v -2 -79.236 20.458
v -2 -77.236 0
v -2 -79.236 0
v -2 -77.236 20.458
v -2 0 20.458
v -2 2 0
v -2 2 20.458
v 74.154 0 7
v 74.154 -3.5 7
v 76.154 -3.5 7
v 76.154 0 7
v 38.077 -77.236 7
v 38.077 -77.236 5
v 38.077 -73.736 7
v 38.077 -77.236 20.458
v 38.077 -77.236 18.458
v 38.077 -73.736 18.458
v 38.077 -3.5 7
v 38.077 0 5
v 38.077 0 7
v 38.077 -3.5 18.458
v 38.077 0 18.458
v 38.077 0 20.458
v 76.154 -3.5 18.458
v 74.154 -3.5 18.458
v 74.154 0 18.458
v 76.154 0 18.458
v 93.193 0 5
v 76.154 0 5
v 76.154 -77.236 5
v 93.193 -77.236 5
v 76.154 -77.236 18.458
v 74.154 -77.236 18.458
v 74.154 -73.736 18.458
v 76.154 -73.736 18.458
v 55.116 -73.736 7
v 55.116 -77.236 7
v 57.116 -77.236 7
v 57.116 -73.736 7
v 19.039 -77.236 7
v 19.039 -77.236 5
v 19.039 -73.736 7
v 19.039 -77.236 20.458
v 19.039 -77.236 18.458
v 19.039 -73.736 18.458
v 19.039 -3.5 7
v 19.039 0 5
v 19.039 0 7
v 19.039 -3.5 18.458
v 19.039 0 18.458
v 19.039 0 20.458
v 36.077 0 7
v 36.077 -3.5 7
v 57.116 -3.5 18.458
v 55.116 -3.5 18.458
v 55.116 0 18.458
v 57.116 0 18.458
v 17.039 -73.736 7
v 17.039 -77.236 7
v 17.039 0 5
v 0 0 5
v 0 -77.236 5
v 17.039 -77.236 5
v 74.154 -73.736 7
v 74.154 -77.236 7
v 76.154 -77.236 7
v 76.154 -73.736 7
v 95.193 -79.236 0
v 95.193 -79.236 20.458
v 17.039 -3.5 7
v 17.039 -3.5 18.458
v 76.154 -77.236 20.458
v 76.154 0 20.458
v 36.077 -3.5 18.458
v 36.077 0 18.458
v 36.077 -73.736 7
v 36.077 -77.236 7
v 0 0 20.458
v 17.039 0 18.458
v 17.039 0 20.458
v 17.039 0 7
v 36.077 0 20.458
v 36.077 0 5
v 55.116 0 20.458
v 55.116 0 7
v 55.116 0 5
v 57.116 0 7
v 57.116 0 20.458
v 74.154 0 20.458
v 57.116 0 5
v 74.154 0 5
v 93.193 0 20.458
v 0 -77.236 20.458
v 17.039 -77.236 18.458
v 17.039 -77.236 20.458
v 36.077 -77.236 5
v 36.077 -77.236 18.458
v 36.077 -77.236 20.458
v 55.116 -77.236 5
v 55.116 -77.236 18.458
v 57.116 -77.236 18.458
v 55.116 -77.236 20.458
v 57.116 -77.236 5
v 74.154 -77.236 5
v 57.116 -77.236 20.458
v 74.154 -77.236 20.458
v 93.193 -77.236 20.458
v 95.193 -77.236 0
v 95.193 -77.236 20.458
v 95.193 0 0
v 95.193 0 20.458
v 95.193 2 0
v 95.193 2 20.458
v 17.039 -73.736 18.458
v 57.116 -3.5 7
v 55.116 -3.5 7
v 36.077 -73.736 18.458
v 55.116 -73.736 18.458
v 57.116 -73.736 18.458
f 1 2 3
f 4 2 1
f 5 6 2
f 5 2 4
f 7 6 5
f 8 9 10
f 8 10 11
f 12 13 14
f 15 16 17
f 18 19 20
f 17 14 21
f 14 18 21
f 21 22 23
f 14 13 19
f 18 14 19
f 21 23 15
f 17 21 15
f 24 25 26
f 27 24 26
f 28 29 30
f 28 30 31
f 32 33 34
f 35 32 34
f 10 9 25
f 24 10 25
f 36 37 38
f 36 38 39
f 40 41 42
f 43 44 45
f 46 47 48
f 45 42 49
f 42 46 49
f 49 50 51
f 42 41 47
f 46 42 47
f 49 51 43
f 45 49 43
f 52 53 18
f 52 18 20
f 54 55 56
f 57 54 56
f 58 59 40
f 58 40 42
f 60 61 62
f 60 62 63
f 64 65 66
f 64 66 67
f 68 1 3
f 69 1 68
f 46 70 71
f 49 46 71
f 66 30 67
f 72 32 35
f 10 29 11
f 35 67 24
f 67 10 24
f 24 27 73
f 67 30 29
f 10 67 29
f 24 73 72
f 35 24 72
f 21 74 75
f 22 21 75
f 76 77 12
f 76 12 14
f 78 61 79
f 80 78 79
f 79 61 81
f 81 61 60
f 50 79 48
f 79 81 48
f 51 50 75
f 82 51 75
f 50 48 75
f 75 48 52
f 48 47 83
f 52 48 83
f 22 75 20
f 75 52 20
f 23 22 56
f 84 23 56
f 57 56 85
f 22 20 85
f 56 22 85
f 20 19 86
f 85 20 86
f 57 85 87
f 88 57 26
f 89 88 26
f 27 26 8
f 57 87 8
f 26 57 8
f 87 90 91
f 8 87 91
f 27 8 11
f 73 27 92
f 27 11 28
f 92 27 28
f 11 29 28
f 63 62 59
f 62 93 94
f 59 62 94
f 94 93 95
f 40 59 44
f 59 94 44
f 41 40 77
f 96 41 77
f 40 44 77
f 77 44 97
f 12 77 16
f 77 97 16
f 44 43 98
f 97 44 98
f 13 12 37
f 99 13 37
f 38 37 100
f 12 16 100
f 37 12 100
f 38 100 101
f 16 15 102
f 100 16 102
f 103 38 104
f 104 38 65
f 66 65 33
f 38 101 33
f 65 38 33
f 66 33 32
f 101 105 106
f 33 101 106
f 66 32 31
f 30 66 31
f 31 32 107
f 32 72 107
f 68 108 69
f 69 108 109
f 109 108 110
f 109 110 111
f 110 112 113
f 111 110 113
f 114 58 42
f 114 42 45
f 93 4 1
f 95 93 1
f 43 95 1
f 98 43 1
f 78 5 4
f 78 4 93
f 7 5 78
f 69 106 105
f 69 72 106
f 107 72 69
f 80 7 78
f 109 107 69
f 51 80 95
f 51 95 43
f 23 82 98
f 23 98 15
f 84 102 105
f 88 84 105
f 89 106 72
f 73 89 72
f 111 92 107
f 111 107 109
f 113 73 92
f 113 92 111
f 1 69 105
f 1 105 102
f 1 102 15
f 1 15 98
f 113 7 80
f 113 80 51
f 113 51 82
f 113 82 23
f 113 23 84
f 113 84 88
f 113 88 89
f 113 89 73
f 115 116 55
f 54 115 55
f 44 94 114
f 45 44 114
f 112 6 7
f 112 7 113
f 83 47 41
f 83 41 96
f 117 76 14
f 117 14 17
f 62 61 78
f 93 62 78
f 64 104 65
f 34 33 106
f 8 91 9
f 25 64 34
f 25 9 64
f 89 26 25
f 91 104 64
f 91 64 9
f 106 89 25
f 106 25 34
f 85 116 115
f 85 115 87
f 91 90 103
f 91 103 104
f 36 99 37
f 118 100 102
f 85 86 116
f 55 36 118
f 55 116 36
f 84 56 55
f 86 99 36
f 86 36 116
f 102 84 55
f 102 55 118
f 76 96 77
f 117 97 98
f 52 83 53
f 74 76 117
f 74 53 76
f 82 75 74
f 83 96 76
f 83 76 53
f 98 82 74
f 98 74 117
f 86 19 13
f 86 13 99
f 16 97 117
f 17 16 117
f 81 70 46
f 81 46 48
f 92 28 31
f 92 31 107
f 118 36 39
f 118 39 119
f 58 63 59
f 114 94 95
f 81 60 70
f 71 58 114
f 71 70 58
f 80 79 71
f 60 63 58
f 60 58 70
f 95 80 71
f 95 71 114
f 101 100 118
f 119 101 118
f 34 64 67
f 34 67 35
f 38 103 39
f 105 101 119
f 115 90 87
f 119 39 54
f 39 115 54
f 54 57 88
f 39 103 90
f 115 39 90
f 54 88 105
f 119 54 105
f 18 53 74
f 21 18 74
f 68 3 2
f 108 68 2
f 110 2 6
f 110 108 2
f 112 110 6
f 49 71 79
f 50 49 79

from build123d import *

# Parameters (mm, degrees)
SKETCH1_W           = 95.192719723
SKETCH1_H           = 77.236030742
BOSS_EXTRUDE1_DEPTH = 5
SKETCH2_W           = 20.458340989
SKETCH2_H           = 77.236030742
BOSS_EXTRUDE2_DEPTH = 2
SKETCH3_W           = 97.192719723
SKETCH3_H           = 20.458340989
BOSS_EXTRUDE3_DEPTH = 2
SKETCH4_W           = 97.192719723
SKETCH4_H           = 20.458340989
BOSS_EXTRUDE4_DEPTH = 2
LPATTERN1_COUNT     = 6
LPATTERN1_PITCH     = 19.038543945
CUT_EXTRUDE1_REACH  = 115.159
SKETCH7_W           = 11.458340989
SKETCH7_H           = 3.5


with BuildPart() as part:
    # Sketch1 → Boss-Extrude1 (new body)
    with BuildSketch(Plane.XY):
        with Locations((47.596359862, -38.618015371)):
            Rectangle(SKETCH1_W, SKETCH1_H)
    extrude(amount=BOSS_EXTRUDE1_DEPTH)

    # Sketch2 → Boss-Extrude2 (add)
    with BuildSketch(Plane.ZY):
        with Locations((10.229170494, -38.618015371)):
            Rectangle(SKETCH2_W, SKETCH2_H)
    boss_extrude2 = extrude(amount=BOSS_EXTRUDE2_DEPTH)

    # Sketch3 → Boss-Extrude3 (add)
    with BuildSketch(Plane(origin=(0, 0, 0), x_dir=(1, 0, 0), z_dir=(0, 1, 0))):
        with Locations((46.596359862, -10.229170494)):
            Rectangle(SKETCH3_W, SKETCH3_H)
    extrude(amount=BOSS_EXTRUDE3_DEPTH)

    # Sketch4 → Boss-Extrude4 (add)
    with BuildSketch(Plane.XZ.offset(77.236030742)):
        with Locations((46.596359862, 10.229170494)):
            Rectangle(SKETCH4_W, SKETCH4_H)
    extrude(amount=BOSS_EXTRUDE4_DEPTH)

    # LPattern1: Boss-Extrude2 ×6
    with Locations(*[(i * LPATTERN1_PITCH, 0, 0) for i in range(1, LPATTERN1_COUNT)]):
        add(boss_extrude2)

    # Cut-Extrude1: up to this face of the body (flat: up to its plane)
    cut_extrude1_end = Plane(part.part.faces().sort_by_distance((76.154175778, -38.618015371, 12.729170494))[0])
    # Sketch7 → Cut-Extrude1 (cut, up to the picked face)
    with BuildSketch(Plane.ZY.offset(-17.038543945), mode=Mode.PRIVATE) as cut_extrude1_sk1:
        with Locations((12.729170494, -1.75)):
            Rectangle(SKETCH7_W, SKETCH7_H)
    cut_extrude1_tool1 = split(extrude(cut_extrude1_sk1.sketch, amount=-CUT_EXTRUDE1_REACH, mode=Mode.PRIVATE), bisect_by=cut_extrude1_end, keep=Keep.BOTH, mode=Mode.PRIVATE)
    # Sketch7 → Cut-Extrude1 (cut, up to the picked face)
    with BuildSketch(Plane.ZY.offset(-17.038543945), mode=Mode.PRIVATE) as cut_extrude1_sk2:
        with Locations((12.729170494, -75.486030742)):
            Rectangle(SKETCH7_W, SKETCH7_H)
    cut_extrude1_tool2 = split(extrude(cut_extrude1_sk2.sketch, amount=-CUT_EXTRUDE1_REACH, mode=Mode.PRIVATE), bisect_by=cut_extrude1_end, keep=Keep.BOTH, mode=Mode.PRIVATE)
    add(cut_extrude1_tool1.solids().sort_by(Axis((17.038544, -1.75, 12.72917), (1, 0, 0)))[0], mode=Mode.SUBTRACT)
    add(cut_extrude1_tool2.solids().sort_by(Axis((17.038544, -75.486031, 12.72917), (1, 0, 0)))[0], mode=Mode.SUBTRACT)


solid = part.part
